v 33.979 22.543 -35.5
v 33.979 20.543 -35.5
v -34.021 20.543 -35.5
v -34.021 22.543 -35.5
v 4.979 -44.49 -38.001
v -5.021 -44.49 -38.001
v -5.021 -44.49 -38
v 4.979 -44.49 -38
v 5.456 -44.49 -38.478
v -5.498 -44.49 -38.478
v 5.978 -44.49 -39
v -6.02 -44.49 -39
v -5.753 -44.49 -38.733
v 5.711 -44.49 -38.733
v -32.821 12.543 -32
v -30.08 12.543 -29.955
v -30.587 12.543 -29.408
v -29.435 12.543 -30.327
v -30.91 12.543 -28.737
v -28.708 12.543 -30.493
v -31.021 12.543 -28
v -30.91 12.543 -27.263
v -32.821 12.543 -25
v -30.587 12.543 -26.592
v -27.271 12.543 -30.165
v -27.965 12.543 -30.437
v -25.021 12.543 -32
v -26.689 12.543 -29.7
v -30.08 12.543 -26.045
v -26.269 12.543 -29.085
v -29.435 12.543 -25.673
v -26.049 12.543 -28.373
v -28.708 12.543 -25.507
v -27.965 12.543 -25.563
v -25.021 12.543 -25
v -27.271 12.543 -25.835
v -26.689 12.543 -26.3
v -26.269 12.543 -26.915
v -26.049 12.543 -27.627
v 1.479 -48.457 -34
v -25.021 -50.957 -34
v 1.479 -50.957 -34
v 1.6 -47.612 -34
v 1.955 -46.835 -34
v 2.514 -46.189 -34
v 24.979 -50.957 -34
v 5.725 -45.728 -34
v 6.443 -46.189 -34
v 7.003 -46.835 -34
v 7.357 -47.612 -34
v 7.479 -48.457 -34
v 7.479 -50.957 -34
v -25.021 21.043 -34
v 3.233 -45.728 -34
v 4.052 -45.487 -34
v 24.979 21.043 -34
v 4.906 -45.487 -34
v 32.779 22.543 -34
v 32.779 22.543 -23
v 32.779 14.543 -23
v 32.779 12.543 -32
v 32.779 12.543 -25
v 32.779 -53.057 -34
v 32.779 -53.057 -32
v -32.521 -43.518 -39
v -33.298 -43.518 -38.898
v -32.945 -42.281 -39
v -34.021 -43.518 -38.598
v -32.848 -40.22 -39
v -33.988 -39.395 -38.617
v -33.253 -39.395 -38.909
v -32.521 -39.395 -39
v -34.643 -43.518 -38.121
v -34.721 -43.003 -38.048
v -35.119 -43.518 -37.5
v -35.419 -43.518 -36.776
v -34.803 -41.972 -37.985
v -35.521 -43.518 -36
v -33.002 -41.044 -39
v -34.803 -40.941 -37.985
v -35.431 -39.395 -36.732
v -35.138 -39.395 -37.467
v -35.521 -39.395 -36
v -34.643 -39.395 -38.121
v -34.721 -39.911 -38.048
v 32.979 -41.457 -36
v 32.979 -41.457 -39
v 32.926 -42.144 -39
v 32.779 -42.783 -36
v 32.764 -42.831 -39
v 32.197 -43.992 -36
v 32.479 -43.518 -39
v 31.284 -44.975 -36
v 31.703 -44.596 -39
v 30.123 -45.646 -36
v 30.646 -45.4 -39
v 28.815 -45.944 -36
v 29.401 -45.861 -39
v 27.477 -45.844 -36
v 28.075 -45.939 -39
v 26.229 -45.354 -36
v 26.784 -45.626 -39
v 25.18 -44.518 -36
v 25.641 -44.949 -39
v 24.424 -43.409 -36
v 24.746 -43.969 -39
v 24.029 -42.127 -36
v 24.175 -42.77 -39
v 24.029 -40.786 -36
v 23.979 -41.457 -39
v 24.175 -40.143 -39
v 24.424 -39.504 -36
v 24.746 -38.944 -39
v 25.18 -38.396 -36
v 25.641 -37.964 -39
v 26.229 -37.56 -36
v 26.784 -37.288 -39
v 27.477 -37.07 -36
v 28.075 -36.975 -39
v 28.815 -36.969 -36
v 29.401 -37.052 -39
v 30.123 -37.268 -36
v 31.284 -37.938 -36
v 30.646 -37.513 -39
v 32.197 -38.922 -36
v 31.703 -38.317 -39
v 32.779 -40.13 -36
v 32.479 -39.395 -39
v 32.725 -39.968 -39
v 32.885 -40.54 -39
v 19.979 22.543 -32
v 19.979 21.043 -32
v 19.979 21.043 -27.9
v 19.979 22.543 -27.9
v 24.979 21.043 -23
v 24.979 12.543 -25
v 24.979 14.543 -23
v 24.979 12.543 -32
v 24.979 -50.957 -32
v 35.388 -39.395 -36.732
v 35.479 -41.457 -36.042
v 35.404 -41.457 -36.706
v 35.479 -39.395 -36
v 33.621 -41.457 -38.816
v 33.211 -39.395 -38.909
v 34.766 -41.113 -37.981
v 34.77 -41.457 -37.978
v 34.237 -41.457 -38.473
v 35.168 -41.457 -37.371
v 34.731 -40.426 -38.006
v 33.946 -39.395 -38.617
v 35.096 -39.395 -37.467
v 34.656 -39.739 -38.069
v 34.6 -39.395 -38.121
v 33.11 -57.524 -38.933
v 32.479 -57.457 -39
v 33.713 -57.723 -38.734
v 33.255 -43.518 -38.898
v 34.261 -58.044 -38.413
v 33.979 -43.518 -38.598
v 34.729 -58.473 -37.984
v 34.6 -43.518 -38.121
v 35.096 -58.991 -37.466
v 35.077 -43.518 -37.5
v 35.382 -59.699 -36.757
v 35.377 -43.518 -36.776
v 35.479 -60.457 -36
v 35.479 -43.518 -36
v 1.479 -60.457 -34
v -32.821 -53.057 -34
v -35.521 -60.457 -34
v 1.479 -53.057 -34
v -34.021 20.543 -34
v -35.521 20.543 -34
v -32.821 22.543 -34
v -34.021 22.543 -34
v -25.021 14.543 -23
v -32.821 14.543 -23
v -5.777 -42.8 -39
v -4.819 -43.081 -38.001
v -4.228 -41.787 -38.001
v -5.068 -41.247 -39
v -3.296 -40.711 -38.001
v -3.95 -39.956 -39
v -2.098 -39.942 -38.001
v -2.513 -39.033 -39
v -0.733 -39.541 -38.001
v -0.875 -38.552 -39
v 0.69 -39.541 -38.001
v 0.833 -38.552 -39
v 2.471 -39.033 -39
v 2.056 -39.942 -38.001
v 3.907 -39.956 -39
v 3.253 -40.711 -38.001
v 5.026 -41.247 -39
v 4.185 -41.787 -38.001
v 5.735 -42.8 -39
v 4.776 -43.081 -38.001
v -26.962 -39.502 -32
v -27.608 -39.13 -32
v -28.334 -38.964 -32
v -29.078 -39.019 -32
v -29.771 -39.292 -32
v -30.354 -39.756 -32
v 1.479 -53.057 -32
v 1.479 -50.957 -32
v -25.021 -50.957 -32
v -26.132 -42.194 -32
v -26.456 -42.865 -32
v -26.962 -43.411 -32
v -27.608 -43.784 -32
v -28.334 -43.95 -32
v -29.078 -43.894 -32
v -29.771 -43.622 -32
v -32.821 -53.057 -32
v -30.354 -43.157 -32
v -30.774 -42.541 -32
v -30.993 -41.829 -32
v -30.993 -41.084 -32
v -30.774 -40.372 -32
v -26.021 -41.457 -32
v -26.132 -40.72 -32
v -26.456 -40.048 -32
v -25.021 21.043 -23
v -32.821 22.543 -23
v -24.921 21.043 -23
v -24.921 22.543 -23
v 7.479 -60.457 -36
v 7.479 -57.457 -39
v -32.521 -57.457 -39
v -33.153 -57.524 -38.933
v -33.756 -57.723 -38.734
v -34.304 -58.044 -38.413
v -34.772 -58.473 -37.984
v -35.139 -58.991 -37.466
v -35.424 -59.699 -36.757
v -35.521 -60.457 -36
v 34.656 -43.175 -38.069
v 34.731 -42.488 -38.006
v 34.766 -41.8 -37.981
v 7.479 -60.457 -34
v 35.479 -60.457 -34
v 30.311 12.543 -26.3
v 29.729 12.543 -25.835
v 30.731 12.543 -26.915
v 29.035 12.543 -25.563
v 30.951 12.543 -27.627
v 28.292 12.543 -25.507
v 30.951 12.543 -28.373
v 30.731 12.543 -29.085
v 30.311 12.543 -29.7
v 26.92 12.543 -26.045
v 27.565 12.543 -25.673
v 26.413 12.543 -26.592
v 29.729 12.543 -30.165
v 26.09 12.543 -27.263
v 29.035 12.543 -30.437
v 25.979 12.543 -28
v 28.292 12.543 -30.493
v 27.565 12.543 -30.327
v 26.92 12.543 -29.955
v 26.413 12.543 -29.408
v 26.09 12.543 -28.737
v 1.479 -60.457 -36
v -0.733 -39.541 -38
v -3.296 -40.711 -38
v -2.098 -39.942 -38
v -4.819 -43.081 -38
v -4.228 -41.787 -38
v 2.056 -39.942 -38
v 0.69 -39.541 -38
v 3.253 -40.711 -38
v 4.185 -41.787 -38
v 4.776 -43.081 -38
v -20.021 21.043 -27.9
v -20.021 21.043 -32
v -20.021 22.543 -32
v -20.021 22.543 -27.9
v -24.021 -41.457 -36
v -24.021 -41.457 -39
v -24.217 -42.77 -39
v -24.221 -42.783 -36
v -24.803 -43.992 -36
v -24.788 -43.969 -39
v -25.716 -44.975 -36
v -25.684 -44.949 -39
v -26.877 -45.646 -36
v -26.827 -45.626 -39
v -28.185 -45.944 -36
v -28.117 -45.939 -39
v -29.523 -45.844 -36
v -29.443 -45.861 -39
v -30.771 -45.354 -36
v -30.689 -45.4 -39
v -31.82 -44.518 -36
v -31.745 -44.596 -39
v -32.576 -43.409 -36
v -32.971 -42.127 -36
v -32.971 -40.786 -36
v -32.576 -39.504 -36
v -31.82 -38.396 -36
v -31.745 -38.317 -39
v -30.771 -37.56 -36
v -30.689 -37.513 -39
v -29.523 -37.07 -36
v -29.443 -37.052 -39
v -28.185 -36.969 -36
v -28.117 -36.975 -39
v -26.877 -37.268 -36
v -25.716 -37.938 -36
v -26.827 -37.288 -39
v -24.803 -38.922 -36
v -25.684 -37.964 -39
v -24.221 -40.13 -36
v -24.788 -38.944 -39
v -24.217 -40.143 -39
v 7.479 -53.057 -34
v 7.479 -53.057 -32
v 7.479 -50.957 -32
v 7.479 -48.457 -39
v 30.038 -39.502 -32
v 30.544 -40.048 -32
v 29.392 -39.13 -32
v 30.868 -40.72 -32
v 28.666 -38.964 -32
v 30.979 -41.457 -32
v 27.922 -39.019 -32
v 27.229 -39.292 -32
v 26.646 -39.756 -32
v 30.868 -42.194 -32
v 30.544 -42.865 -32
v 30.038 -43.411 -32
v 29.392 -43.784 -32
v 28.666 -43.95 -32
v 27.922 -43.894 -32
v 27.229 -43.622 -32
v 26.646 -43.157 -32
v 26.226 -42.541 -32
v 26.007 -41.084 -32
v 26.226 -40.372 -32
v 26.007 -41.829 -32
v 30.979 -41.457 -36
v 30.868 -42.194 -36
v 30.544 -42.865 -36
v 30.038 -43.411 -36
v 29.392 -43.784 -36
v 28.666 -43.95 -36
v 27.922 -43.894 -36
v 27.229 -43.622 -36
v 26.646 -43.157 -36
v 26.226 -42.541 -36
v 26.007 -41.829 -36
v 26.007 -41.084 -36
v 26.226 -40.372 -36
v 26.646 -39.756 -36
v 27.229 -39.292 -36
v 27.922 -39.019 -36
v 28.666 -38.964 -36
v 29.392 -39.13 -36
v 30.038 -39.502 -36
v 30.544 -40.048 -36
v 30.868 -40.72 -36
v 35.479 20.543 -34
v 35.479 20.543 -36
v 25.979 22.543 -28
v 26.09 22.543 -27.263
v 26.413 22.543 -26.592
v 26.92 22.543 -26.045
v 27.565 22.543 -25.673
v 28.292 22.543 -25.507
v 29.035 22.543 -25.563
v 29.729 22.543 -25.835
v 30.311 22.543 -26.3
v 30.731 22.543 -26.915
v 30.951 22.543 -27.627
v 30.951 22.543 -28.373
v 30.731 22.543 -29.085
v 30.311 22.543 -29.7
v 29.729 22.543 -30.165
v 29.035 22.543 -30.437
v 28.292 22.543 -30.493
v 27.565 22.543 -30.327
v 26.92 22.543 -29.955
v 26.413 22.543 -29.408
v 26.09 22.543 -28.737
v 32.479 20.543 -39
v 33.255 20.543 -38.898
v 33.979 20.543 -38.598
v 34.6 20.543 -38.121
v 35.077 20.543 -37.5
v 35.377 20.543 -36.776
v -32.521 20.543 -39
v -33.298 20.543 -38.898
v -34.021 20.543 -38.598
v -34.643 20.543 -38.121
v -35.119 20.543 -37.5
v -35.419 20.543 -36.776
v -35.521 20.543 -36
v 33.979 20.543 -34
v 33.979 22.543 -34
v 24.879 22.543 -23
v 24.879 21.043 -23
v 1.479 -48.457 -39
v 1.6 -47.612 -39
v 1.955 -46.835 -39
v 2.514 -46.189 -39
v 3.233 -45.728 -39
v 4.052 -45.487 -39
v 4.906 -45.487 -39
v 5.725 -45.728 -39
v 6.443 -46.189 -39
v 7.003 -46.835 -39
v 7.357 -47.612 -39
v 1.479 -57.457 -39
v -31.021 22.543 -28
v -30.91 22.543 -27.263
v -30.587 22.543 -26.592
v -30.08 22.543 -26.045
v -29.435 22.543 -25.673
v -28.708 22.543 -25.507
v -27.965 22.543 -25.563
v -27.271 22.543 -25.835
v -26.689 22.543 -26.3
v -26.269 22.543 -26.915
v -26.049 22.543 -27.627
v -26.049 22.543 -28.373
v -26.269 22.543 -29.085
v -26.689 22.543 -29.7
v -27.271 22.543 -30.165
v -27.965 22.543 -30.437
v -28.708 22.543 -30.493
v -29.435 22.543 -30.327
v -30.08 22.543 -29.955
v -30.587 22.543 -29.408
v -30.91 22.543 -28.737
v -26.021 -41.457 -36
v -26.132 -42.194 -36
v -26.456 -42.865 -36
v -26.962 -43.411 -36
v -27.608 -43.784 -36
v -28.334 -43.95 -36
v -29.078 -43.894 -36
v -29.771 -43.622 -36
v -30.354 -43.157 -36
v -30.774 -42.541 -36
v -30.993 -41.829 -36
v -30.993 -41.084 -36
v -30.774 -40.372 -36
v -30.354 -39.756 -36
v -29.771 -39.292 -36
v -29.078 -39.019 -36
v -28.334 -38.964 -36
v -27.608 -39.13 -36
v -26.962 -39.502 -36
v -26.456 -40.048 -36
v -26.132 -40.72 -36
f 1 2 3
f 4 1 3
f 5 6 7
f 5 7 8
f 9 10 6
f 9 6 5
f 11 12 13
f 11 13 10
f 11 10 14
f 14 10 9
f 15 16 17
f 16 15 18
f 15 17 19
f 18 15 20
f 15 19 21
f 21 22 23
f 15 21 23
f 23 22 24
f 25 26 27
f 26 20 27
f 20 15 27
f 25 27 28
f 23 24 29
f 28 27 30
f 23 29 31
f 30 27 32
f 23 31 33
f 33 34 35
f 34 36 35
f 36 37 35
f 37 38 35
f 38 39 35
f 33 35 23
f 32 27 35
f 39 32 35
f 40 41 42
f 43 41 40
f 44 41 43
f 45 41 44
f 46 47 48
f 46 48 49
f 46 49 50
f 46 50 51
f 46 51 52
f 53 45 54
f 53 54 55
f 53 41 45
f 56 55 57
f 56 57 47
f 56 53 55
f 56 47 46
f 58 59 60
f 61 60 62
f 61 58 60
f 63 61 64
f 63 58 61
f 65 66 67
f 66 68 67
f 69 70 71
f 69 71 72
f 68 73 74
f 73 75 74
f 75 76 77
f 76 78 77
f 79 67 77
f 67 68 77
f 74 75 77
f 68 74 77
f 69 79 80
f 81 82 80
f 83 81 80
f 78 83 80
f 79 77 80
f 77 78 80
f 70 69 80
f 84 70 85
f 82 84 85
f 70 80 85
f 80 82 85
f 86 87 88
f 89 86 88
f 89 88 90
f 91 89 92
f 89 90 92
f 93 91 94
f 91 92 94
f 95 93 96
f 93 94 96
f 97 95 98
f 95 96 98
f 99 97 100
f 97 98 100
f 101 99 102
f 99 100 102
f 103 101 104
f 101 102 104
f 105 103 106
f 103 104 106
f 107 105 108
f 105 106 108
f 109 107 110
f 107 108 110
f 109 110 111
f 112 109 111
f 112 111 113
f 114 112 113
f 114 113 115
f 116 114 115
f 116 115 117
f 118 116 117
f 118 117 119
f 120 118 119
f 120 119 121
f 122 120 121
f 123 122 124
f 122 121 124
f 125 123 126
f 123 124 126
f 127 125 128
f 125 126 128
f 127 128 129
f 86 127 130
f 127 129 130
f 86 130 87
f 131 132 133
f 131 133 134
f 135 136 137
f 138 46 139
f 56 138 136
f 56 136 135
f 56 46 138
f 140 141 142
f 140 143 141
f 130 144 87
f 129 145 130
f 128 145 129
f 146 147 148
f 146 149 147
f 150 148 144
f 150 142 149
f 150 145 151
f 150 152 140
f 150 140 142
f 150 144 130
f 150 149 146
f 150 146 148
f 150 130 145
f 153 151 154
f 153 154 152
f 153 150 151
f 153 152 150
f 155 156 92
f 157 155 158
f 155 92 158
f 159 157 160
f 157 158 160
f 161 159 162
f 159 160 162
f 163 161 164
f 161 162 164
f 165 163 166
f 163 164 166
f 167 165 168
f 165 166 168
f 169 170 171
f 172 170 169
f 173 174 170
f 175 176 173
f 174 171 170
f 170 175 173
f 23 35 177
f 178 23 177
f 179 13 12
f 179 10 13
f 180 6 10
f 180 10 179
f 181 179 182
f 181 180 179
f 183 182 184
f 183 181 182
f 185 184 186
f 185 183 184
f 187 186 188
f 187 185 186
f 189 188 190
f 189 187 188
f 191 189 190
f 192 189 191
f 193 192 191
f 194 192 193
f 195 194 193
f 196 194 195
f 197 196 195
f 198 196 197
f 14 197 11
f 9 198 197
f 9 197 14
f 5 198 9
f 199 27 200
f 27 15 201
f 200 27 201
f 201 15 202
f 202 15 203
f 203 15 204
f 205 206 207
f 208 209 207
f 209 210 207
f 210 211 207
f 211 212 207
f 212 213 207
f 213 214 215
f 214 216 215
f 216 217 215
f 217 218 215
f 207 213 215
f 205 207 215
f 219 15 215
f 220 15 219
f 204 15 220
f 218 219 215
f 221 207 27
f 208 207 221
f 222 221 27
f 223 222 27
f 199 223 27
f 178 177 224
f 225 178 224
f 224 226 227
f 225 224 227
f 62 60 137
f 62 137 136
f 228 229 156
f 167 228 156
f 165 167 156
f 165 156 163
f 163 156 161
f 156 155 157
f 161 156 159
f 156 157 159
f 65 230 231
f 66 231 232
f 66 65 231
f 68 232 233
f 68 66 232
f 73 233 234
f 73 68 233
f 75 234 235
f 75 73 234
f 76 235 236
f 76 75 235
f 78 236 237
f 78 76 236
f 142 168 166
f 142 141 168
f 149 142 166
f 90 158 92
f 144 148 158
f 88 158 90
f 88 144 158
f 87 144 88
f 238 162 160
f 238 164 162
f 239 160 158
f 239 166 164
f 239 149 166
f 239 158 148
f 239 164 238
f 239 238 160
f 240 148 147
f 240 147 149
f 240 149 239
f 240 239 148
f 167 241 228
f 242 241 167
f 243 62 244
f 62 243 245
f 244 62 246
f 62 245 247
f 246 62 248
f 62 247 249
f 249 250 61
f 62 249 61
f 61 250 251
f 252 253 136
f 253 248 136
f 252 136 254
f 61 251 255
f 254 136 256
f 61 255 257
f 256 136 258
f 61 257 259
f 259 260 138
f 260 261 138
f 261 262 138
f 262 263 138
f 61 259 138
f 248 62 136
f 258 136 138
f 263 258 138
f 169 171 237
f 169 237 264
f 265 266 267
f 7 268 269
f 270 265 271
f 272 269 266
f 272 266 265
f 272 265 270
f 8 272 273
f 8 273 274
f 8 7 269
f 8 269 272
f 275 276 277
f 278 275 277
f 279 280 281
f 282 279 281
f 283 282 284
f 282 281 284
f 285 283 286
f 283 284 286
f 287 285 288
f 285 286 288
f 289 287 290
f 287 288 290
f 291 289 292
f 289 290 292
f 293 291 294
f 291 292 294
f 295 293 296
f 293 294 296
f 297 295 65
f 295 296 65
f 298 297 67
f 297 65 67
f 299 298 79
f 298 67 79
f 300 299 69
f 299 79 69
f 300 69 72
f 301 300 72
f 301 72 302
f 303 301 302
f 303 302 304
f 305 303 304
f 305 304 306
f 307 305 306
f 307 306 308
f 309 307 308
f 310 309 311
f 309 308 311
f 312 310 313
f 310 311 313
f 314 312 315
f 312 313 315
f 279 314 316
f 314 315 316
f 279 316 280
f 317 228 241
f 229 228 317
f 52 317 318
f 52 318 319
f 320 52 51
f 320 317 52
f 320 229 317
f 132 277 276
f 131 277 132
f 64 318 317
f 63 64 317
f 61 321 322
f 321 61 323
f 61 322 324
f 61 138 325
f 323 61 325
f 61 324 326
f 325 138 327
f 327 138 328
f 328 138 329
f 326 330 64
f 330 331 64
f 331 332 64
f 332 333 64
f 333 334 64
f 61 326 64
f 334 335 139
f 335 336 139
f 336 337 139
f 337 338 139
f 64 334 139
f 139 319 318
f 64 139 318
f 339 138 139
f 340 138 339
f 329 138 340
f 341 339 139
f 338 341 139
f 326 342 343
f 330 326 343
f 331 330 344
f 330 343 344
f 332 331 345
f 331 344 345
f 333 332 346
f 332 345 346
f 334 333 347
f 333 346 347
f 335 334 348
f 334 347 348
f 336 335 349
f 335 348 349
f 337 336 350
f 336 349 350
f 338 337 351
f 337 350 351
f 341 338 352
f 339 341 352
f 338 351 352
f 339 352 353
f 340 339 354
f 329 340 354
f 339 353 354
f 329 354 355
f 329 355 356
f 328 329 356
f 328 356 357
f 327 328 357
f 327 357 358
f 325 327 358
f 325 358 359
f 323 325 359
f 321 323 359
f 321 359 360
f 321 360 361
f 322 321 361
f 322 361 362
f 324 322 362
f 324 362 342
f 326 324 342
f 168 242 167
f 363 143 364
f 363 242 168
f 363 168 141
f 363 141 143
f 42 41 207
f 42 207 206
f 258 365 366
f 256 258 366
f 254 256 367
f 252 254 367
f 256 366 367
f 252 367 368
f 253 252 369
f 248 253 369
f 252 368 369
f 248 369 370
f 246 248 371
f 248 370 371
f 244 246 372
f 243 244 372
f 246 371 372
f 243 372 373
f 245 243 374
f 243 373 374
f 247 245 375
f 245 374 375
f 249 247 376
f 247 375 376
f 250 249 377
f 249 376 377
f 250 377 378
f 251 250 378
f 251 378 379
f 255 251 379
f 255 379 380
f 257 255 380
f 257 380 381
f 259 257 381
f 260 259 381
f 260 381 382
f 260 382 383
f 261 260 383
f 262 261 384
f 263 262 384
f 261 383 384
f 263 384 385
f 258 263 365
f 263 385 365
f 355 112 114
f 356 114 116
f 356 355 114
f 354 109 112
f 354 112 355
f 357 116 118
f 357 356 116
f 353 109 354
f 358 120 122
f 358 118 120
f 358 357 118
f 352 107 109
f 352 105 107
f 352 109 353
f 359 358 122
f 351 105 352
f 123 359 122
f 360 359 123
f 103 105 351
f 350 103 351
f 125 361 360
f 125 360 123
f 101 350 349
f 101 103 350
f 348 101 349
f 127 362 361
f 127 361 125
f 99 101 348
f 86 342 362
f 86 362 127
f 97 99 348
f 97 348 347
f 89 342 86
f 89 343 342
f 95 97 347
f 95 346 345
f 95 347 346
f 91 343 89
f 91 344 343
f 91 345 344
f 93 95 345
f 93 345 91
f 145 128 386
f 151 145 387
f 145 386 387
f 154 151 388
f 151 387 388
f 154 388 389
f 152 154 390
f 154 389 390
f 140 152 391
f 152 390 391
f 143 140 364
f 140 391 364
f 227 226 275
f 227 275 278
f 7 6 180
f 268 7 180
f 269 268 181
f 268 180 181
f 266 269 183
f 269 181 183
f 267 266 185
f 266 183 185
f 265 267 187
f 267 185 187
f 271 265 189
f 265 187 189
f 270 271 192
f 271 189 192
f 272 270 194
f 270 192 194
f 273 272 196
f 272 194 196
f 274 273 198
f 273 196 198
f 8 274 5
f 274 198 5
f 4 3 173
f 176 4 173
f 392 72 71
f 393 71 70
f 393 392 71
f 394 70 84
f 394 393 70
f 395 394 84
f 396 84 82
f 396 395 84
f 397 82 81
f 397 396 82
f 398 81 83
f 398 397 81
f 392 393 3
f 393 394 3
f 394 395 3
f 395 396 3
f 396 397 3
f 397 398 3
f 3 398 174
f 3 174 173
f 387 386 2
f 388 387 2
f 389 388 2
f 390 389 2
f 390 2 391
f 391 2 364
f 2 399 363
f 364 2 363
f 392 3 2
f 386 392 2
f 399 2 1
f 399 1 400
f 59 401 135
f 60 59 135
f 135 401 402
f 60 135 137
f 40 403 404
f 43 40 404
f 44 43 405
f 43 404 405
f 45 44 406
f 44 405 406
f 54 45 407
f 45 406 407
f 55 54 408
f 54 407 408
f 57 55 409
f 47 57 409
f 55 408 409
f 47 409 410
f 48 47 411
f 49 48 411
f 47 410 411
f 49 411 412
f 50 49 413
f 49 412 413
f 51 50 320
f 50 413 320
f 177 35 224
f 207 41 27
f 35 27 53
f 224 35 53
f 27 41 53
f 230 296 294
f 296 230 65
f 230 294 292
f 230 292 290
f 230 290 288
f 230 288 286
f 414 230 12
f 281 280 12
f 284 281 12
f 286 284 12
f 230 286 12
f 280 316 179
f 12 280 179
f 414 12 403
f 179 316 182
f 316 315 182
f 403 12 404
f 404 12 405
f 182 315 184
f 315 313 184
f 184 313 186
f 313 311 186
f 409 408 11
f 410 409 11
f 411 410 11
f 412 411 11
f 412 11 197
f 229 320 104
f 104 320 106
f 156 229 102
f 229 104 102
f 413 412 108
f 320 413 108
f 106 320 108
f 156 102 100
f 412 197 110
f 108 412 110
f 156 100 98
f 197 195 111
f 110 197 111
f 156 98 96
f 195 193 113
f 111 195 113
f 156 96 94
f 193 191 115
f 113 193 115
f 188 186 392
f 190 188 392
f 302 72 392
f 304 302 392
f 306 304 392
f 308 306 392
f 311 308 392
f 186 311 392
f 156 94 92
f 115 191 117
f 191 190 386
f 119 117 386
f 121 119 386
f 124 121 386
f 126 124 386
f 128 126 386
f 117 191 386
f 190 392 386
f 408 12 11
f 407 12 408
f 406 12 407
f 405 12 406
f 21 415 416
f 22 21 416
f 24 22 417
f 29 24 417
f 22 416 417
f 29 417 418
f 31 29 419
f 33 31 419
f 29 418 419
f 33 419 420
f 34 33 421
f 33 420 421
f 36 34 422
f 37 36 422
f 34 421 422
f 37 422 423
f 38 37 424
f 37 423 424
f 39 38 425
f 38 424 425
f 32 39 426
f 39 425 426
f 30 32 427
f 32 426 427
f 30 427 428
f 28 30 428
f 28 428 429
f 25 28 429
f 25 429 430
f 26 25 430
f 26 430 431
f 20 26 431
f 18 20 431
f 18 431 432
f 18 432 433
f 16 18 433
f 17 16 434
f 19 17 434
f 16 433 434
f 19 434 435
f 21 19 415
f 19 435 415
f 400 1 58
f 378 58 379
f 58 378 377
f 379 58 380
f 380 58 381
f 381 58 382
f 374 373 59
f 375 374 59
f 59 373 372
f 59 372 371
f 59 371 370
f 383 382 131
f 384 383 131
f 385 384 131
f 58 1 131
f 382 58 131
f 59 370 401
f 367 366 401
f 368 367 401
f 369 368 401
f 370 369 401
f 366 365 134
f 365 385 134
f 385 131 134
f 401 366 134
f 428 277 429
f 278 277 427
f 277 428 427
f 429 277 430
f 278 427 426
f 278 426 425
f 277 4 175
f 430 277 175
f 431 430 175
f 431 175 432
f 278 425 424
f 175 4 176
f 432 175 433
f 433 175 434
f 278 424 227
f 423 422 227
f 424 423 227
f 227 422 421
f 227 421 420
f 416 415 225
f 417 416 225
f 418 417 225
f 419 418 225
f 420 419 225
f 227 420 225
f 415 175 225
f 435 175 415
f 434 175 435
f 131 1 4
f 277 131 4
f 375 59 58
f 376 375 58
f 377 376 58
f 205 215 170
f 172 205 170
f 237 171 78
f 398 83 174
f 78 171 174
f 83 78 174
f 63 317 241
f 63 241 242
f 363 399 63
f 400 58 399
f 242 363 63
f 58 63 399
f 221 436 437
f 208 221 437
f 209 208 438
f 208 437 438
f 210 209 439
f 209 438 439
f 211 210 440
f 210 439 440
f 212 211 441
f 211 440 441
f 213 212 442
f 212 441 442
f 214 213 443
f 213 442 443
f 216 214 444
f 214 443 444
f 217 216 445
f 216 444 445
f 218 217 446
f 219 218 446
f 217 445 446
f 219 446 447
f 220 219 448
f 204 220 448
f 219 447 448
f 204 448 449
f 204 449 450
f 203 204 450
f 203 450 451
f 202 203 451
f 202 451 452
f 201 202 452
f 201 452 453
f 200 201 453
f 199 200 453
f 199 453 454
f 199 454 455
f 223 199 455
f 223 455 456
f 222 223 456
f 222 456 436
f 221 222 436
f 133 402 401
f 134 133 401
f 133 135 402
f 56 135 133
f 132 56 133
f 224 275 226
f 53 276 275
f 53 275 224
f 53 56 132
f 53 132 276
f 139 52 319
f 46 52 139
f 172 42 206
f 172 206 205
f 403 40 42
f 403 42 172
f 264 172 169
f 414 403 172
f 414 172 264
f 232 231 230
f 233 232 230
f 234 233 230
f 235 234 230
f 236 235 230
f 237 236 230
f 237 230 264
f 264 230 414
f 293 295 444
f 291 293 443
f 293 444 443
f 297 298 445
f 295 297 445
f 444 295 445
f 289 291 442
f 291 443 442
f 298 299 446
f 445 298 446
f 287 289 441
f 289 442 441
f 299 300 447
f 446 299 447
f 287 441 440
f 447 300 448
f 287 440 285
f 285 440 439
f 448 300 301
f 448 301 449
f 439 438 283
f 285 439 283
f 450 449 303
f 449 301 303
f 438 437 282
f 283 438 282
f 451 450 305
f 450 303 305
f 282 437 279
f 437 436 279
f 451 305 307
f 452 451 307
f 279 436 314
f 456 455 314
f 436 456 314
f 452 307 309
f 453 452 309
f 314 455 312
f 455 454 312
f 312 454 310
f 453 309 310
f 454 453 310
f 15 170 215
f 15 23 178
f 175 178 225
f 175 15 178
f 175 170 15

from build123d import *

# Parameters (mm, degrees)
SKETCH094_W        = 71
SKETCH094_H        = 81
PAD055_DEPTH       = 5
SKETCH096_W        = 68
SKETCH096_H        = 1.5
PAD053_DEPTH       = 2
SKETCH097_W        = 64.6
SKETCH097_H        = 77.6
PAD054_DEPTH       = 2
SKETCH098_W        = 50
SKETCH098_H        = 72
POCKET086_DEPTH    = 4
SKETCH095_W        = 7.3
SKETCH095_H        = 10
PAD057_DEPTH       = 9
SKETCH099_W        = 5
SKETCH099_H        = 3.5
PAD056_DEPTH       = 9
CHAMFER028_SIZE    = 4.9
SKETCH100_R        = 2.5
POCKET087_DEPTH    = 10
SKETCH102_R        = 2.5
POCKET091_DEPTH    = 10
SKETCH101_R        = 4.5
POCKET088_DEPTH    = 3
POCKET088_FACE29_W = 64.6
POCKET088_FACE29_H = 2
POCKET089_DEPTH    = 2
POCKET089_FACE16_W = 50
POCKET089_FACE16_H = 4
PAD059_DEPTH       = 2
POCKET092_DEPTH    = 2
CHAMFER027_SIZE    = 3
CHAMFER026_SIZE    = 2
SKETCH103_W        = 50
SKETCH103_H        = 72
PAD058_DEPTH       = 2
PAD058_FACE37_W    = 0.5
PAD058_FACE37_H    = 50
POCKET090_DEPTH    = 0.5
PAD061_DEPTH       = 0.5
PAD060_DEPTH       = 0.5
POCKET093_DEPTH    = 1
CHAMFER029_SIZE    = 0.999
FILLET010_R        = 3
POCKET094_DEPTH    = 50


with BuildPart() as part:
    # Sketch094 → Pad055 (new body)
    with BuildSketch(Plane.XY):
        with Locations((-0.121221, -9.466726)):
            Rectangle(SKETCH094_W, SKETCH094_H)
    extrude(amount=-PAD055_DEPTH)

    # Sketch096 (on Face1 of Pad055) → Pad053 (join)
    with BuildSketch(Plane(origin=(0, 31.033274, 0), x_dir=(-1, 0, 0), z_dir=(0, 1, 0))):
        with Locations((0.121221, -0.75)):
            Rectangle(SKETCH096_W, SKETCH096_H)
    extrude(amount=PAD053_DEPTH)

    # Sketch097 (on Face10 of Pad053) → Pad054 (join)
    with BuildSketch(Plane.XY):
        with Locations((-0.121221, -5.766726)):
            Rectangle(SKETCH097_W, SKETCH097_H)
    extrude(amount=PAD054_DEPTH)

    # Sketch098 (on Face13 of Pad054) → Pocket086 (cut)
    with BuildSketch(Plane.XY.offset(2)):
        with Locations((-0.121221, -6.466726)):
            Rectangle(SKETCH098_W, SKETCH098_H)
    extrude(amount=-POCKET086_DEPTH, mode=Mode.SUBTRACT)

    # Sketch095 (on Face14 of Pocket086) → Pad057 (join)
    with BuildSketch(Plane.XY.offset(2)):
        with Locations((28.528779, 28.033274)):
            Rectangle(SKETCH095_W, SKETCH095_H)
        with Locations((-28.771221, 28.033274)):
            Rectangle(SKETCH095_W, SKETCH095_H)
    extrude(amount=PAD057_DEPTH)

    # Sketch099 (on Face1 of Pad057) → Pad056 (join)
    with BuildSketch(Plane.XY.offset(2)):
        with Locations((-22.621221, 31.283274)):
            Rectangle(SKETCH099_W, SKETCH099_H)
        with Locations((22.378779, 31.283274)):
            Rectangle(SKETCH099_W, SKETCH099_H)
    extrude(amount=PAD056_DEPTH)

    # Chamfer028
    chamfer028_edges = [part.edges().sort_by_distance(p)[0] for p in [
        (-20.121221, 31.283274, 11),
        (19.878779, 31.283274, 11),
    ]]
    chamfer(chamfer028_edges, length=CHAMFER028_SIZE)

    # Sketch100 (on Face12 of Chamfer028) → Pocket087 (cut)
    with BuildSketch(Plane(origin=(0, 33.033274, 0), x_dir=(-1, 0, 0), z_dir=(0, 1, 0))):
        with Locations((-28.378779, 6)):
            Circle(SKETCH100_R)
        with Locations((28.621221, 6)):
            Circle(SKETCH100_R)
    extrude(amount=-POCKET087_DEPTH, mode=Mode.SUBTRACT)

    # Sketch102 (on Face30 of Pocket087) → Pocket091 (cut)
    with BuildSketch(Plane(origin=(0, 0, -5), x_dir=(1, 0, 0), z_dir=(0, 0, -1))):
        with Locations((-28.621221, 30.966726)):
            Circle(SKETCH102_R)
        with Locations((28.378779, 30.966726)):
            Circle(SKETCH102_R)
    extrude(amount=-POCKET091_DEPTH, mode=Mode.SUBTRACT)

    # Sketch101 (on Face32 of Pocket091) → Pocket088 (cut)
    with BuildSketch(Plane(origin=(0, 0, -5), x_dir=(1, 0, 0), z_dir=(0, 0, -1))):
        with Locations((-28.621221, 30.966726)):
            Circle(SKETCH101_R)
        with Locations((28.378779, 30.966726)):
            Circle(SKETCH101_R)
    extrude(amount=-POCKET088_DEPTH, mode=Mode.SUBTRACT)

    # Pocket088 Face29 → Pocket089 (cut)
    with BuildSketch(Plane(origin=(-0.121221, -44.566726, 1), x_dir=(-1, 0, 0), z_dir=(0, -1, 0))):
        Rectangle(POCKET088_FACE29_W, POCKET088_FACE29_H)
    extrude(amount=-POCKET089_DEPTH, mode=Mode.SUBTRACT)

    # Pocket089 Face16 → Pad059 (add)
    with BuildSketch(Plane(origin=(-0.121221, -42.466726, 0), x_dir=(1, 0, 0), z_dir=(0, 1, 0))):
        Rectangle(POCKET089_FACE16_W, POCKET089_FACE16_H)
    extrude(amount=PAD059_DEPTH)

    # Pad059 Face1 → Pocket092 (cut)
    with BuildSketch(Plane(origin=(-0.121221, 29.533274, 1.353834), x_dir=(-1, 0, 0), z_dir=(0, -1, 0))):
        Polygon((-25, -9.646166), (-24.9, -9.646166), (-20, -4.746166), (-20, -0.646166), (20, -0.646166), (20, -4.746166), (24.9, -9.646166), (25, -9.646166), (25, 3.353834), (-25, 3.353834), align=None)
    extrude(amount=-POCKET092_DEPTH, mode=Mode.SUBTRACT)

    # Chamfer027
    chamfer027_edges = [part.edges().sort_by_distance(p)[0] for p in [
        (-0.121221, -49.966726, -5),
    ]]
    chamfer(chamfer027_edges, length=CHAMFER027_SIZE)

    # Chamfer026
    chamfer026_edges = [part.edges().sort_by_distance(p)[0] for p in [
        (-28.771221, 23.033274, 11),
        (28.528779, 23.033274, 11),
    ]]
    chamfer(chamfer026_edges, length=CHAMFER026_SIZE)

    # Sketch103 (on Face10 of Chamfer026) → Pad058 (join)
    with BuildSketch(Plane.XY.offset(-2)):
        with Locations((-0.121221, -4.466726)):
            Rectangle(SKETCH103_W, SKETCH103_H)
    extrude(amount=PAD058_DEPTH)

    # Pad058 Face37 → Pocket090 (cut)
    with BuildSketch(Plane(origin=(-0.121221, 31.283274, -2), x_dir=(0, -1, 0), z_dir=(0, 0, -1))):
        Rectangle(PAD058_FACE37_W, PAD058_FACE37_H)
    extrude(amount=-POCKET090_DEPTH, mode=Mode.SUBTRACT)

    # Pocket090 Face9 → Pad061 (add)
    with BuildSketch(Plane(origin=(-32.421221, 7.336396, 2.99136), x_dir=(0, 1, 0), z_dir=(-1, 0, 0))):
        Polygon((17.696878, -8.00864), (25.696878, -8.00864), (25.696878, 2.99136), (-49.903122, 2.99136), (-49.903122, 0.99136), (15.696878, 0.99136), (15.696878, -6.00864), align=None)
    extrude(amount=PAD061_DEPTH)

    # Pad061 Face19 → Pad060 (add)
    with BuildSketch(Plane(origin=(32.178779, 7.336396, 2.99136), x_dir=(0, -1, 0), z_dir=(1, 0, 0))):
        Polygon((-15.696878, -6.00864), (-15.696878, 0.99136), (49.903122, 0.99136), (49.903122, 2.99136), (-25.696878, 2.99136), (-25.696878, -8.00864), (-17.696878, -8.00864), align=None)
    extrude(amount=PAD060_DEPTH)

    # Sketch104 (on Face22 of Pad060) → Pocket093 (cut)
    with BuildSketch(Plane(origin=(0, 0, -5), x_dir=(1, 0, 0), z_dir=(0, 0, -1))):
        with BuildLine():
            ThreePointArc((-5.121221, 34), (-0.121221, 28.999784), (4.878779, 34))
            Line((-5.121221, 34), (4.878779, 34))
        make_face()
    extrude(amount=-POCKET093_DEPTH, mode=Mode.SUBTRACT)

    # Chamfer029
    chamfer029_edges = [part.edges().sort_by_distance(p)[0] for p in [
        (-0.121221, -28.999784, -5),
    ]]
    chamfer(chamfer029_edges, length=CHAMFER029_SIZE)

    # Fillet010
    fillet010_edges = [part.edges().sort_by_distance(p)[0] for p in [
        (-35.621221, -7.966726, -5),
        (35.378779, -7.966726, -5),
    ]]
    fillet(fillet010_edges, radius=FILLET010_R)

    # Sketch105 (on Face1 of Fillet010) → Pocket094 (cut)
    with BuildSketch(Plane(origin=(0, 0, -5), x_dir=(1, 0, 0), z_dir=(0, 0, -1))):
        with BuildLine():
            Line((1.378779, 37.966726), (1.378779, 49.966726))
            Line((1.378779, 49.966726), (7.378779, 49.966726))
            Line((7.378779, 49.966726), (7.378779, 37.966726))
            ThreePointArc((1.378779, 37.966726), (4.378779, 34.966726), (7.378779, 37.966726))
        make_face()
    extrude(amount=-POCKET094_DEPTH, mode=Mode.SUBTRACT)


with BuildPart() as part_1:
    # Body007 placement: moved
    add(part.part.moved(Location((0.1, -10.49, -34))))


solid = part_1.part
